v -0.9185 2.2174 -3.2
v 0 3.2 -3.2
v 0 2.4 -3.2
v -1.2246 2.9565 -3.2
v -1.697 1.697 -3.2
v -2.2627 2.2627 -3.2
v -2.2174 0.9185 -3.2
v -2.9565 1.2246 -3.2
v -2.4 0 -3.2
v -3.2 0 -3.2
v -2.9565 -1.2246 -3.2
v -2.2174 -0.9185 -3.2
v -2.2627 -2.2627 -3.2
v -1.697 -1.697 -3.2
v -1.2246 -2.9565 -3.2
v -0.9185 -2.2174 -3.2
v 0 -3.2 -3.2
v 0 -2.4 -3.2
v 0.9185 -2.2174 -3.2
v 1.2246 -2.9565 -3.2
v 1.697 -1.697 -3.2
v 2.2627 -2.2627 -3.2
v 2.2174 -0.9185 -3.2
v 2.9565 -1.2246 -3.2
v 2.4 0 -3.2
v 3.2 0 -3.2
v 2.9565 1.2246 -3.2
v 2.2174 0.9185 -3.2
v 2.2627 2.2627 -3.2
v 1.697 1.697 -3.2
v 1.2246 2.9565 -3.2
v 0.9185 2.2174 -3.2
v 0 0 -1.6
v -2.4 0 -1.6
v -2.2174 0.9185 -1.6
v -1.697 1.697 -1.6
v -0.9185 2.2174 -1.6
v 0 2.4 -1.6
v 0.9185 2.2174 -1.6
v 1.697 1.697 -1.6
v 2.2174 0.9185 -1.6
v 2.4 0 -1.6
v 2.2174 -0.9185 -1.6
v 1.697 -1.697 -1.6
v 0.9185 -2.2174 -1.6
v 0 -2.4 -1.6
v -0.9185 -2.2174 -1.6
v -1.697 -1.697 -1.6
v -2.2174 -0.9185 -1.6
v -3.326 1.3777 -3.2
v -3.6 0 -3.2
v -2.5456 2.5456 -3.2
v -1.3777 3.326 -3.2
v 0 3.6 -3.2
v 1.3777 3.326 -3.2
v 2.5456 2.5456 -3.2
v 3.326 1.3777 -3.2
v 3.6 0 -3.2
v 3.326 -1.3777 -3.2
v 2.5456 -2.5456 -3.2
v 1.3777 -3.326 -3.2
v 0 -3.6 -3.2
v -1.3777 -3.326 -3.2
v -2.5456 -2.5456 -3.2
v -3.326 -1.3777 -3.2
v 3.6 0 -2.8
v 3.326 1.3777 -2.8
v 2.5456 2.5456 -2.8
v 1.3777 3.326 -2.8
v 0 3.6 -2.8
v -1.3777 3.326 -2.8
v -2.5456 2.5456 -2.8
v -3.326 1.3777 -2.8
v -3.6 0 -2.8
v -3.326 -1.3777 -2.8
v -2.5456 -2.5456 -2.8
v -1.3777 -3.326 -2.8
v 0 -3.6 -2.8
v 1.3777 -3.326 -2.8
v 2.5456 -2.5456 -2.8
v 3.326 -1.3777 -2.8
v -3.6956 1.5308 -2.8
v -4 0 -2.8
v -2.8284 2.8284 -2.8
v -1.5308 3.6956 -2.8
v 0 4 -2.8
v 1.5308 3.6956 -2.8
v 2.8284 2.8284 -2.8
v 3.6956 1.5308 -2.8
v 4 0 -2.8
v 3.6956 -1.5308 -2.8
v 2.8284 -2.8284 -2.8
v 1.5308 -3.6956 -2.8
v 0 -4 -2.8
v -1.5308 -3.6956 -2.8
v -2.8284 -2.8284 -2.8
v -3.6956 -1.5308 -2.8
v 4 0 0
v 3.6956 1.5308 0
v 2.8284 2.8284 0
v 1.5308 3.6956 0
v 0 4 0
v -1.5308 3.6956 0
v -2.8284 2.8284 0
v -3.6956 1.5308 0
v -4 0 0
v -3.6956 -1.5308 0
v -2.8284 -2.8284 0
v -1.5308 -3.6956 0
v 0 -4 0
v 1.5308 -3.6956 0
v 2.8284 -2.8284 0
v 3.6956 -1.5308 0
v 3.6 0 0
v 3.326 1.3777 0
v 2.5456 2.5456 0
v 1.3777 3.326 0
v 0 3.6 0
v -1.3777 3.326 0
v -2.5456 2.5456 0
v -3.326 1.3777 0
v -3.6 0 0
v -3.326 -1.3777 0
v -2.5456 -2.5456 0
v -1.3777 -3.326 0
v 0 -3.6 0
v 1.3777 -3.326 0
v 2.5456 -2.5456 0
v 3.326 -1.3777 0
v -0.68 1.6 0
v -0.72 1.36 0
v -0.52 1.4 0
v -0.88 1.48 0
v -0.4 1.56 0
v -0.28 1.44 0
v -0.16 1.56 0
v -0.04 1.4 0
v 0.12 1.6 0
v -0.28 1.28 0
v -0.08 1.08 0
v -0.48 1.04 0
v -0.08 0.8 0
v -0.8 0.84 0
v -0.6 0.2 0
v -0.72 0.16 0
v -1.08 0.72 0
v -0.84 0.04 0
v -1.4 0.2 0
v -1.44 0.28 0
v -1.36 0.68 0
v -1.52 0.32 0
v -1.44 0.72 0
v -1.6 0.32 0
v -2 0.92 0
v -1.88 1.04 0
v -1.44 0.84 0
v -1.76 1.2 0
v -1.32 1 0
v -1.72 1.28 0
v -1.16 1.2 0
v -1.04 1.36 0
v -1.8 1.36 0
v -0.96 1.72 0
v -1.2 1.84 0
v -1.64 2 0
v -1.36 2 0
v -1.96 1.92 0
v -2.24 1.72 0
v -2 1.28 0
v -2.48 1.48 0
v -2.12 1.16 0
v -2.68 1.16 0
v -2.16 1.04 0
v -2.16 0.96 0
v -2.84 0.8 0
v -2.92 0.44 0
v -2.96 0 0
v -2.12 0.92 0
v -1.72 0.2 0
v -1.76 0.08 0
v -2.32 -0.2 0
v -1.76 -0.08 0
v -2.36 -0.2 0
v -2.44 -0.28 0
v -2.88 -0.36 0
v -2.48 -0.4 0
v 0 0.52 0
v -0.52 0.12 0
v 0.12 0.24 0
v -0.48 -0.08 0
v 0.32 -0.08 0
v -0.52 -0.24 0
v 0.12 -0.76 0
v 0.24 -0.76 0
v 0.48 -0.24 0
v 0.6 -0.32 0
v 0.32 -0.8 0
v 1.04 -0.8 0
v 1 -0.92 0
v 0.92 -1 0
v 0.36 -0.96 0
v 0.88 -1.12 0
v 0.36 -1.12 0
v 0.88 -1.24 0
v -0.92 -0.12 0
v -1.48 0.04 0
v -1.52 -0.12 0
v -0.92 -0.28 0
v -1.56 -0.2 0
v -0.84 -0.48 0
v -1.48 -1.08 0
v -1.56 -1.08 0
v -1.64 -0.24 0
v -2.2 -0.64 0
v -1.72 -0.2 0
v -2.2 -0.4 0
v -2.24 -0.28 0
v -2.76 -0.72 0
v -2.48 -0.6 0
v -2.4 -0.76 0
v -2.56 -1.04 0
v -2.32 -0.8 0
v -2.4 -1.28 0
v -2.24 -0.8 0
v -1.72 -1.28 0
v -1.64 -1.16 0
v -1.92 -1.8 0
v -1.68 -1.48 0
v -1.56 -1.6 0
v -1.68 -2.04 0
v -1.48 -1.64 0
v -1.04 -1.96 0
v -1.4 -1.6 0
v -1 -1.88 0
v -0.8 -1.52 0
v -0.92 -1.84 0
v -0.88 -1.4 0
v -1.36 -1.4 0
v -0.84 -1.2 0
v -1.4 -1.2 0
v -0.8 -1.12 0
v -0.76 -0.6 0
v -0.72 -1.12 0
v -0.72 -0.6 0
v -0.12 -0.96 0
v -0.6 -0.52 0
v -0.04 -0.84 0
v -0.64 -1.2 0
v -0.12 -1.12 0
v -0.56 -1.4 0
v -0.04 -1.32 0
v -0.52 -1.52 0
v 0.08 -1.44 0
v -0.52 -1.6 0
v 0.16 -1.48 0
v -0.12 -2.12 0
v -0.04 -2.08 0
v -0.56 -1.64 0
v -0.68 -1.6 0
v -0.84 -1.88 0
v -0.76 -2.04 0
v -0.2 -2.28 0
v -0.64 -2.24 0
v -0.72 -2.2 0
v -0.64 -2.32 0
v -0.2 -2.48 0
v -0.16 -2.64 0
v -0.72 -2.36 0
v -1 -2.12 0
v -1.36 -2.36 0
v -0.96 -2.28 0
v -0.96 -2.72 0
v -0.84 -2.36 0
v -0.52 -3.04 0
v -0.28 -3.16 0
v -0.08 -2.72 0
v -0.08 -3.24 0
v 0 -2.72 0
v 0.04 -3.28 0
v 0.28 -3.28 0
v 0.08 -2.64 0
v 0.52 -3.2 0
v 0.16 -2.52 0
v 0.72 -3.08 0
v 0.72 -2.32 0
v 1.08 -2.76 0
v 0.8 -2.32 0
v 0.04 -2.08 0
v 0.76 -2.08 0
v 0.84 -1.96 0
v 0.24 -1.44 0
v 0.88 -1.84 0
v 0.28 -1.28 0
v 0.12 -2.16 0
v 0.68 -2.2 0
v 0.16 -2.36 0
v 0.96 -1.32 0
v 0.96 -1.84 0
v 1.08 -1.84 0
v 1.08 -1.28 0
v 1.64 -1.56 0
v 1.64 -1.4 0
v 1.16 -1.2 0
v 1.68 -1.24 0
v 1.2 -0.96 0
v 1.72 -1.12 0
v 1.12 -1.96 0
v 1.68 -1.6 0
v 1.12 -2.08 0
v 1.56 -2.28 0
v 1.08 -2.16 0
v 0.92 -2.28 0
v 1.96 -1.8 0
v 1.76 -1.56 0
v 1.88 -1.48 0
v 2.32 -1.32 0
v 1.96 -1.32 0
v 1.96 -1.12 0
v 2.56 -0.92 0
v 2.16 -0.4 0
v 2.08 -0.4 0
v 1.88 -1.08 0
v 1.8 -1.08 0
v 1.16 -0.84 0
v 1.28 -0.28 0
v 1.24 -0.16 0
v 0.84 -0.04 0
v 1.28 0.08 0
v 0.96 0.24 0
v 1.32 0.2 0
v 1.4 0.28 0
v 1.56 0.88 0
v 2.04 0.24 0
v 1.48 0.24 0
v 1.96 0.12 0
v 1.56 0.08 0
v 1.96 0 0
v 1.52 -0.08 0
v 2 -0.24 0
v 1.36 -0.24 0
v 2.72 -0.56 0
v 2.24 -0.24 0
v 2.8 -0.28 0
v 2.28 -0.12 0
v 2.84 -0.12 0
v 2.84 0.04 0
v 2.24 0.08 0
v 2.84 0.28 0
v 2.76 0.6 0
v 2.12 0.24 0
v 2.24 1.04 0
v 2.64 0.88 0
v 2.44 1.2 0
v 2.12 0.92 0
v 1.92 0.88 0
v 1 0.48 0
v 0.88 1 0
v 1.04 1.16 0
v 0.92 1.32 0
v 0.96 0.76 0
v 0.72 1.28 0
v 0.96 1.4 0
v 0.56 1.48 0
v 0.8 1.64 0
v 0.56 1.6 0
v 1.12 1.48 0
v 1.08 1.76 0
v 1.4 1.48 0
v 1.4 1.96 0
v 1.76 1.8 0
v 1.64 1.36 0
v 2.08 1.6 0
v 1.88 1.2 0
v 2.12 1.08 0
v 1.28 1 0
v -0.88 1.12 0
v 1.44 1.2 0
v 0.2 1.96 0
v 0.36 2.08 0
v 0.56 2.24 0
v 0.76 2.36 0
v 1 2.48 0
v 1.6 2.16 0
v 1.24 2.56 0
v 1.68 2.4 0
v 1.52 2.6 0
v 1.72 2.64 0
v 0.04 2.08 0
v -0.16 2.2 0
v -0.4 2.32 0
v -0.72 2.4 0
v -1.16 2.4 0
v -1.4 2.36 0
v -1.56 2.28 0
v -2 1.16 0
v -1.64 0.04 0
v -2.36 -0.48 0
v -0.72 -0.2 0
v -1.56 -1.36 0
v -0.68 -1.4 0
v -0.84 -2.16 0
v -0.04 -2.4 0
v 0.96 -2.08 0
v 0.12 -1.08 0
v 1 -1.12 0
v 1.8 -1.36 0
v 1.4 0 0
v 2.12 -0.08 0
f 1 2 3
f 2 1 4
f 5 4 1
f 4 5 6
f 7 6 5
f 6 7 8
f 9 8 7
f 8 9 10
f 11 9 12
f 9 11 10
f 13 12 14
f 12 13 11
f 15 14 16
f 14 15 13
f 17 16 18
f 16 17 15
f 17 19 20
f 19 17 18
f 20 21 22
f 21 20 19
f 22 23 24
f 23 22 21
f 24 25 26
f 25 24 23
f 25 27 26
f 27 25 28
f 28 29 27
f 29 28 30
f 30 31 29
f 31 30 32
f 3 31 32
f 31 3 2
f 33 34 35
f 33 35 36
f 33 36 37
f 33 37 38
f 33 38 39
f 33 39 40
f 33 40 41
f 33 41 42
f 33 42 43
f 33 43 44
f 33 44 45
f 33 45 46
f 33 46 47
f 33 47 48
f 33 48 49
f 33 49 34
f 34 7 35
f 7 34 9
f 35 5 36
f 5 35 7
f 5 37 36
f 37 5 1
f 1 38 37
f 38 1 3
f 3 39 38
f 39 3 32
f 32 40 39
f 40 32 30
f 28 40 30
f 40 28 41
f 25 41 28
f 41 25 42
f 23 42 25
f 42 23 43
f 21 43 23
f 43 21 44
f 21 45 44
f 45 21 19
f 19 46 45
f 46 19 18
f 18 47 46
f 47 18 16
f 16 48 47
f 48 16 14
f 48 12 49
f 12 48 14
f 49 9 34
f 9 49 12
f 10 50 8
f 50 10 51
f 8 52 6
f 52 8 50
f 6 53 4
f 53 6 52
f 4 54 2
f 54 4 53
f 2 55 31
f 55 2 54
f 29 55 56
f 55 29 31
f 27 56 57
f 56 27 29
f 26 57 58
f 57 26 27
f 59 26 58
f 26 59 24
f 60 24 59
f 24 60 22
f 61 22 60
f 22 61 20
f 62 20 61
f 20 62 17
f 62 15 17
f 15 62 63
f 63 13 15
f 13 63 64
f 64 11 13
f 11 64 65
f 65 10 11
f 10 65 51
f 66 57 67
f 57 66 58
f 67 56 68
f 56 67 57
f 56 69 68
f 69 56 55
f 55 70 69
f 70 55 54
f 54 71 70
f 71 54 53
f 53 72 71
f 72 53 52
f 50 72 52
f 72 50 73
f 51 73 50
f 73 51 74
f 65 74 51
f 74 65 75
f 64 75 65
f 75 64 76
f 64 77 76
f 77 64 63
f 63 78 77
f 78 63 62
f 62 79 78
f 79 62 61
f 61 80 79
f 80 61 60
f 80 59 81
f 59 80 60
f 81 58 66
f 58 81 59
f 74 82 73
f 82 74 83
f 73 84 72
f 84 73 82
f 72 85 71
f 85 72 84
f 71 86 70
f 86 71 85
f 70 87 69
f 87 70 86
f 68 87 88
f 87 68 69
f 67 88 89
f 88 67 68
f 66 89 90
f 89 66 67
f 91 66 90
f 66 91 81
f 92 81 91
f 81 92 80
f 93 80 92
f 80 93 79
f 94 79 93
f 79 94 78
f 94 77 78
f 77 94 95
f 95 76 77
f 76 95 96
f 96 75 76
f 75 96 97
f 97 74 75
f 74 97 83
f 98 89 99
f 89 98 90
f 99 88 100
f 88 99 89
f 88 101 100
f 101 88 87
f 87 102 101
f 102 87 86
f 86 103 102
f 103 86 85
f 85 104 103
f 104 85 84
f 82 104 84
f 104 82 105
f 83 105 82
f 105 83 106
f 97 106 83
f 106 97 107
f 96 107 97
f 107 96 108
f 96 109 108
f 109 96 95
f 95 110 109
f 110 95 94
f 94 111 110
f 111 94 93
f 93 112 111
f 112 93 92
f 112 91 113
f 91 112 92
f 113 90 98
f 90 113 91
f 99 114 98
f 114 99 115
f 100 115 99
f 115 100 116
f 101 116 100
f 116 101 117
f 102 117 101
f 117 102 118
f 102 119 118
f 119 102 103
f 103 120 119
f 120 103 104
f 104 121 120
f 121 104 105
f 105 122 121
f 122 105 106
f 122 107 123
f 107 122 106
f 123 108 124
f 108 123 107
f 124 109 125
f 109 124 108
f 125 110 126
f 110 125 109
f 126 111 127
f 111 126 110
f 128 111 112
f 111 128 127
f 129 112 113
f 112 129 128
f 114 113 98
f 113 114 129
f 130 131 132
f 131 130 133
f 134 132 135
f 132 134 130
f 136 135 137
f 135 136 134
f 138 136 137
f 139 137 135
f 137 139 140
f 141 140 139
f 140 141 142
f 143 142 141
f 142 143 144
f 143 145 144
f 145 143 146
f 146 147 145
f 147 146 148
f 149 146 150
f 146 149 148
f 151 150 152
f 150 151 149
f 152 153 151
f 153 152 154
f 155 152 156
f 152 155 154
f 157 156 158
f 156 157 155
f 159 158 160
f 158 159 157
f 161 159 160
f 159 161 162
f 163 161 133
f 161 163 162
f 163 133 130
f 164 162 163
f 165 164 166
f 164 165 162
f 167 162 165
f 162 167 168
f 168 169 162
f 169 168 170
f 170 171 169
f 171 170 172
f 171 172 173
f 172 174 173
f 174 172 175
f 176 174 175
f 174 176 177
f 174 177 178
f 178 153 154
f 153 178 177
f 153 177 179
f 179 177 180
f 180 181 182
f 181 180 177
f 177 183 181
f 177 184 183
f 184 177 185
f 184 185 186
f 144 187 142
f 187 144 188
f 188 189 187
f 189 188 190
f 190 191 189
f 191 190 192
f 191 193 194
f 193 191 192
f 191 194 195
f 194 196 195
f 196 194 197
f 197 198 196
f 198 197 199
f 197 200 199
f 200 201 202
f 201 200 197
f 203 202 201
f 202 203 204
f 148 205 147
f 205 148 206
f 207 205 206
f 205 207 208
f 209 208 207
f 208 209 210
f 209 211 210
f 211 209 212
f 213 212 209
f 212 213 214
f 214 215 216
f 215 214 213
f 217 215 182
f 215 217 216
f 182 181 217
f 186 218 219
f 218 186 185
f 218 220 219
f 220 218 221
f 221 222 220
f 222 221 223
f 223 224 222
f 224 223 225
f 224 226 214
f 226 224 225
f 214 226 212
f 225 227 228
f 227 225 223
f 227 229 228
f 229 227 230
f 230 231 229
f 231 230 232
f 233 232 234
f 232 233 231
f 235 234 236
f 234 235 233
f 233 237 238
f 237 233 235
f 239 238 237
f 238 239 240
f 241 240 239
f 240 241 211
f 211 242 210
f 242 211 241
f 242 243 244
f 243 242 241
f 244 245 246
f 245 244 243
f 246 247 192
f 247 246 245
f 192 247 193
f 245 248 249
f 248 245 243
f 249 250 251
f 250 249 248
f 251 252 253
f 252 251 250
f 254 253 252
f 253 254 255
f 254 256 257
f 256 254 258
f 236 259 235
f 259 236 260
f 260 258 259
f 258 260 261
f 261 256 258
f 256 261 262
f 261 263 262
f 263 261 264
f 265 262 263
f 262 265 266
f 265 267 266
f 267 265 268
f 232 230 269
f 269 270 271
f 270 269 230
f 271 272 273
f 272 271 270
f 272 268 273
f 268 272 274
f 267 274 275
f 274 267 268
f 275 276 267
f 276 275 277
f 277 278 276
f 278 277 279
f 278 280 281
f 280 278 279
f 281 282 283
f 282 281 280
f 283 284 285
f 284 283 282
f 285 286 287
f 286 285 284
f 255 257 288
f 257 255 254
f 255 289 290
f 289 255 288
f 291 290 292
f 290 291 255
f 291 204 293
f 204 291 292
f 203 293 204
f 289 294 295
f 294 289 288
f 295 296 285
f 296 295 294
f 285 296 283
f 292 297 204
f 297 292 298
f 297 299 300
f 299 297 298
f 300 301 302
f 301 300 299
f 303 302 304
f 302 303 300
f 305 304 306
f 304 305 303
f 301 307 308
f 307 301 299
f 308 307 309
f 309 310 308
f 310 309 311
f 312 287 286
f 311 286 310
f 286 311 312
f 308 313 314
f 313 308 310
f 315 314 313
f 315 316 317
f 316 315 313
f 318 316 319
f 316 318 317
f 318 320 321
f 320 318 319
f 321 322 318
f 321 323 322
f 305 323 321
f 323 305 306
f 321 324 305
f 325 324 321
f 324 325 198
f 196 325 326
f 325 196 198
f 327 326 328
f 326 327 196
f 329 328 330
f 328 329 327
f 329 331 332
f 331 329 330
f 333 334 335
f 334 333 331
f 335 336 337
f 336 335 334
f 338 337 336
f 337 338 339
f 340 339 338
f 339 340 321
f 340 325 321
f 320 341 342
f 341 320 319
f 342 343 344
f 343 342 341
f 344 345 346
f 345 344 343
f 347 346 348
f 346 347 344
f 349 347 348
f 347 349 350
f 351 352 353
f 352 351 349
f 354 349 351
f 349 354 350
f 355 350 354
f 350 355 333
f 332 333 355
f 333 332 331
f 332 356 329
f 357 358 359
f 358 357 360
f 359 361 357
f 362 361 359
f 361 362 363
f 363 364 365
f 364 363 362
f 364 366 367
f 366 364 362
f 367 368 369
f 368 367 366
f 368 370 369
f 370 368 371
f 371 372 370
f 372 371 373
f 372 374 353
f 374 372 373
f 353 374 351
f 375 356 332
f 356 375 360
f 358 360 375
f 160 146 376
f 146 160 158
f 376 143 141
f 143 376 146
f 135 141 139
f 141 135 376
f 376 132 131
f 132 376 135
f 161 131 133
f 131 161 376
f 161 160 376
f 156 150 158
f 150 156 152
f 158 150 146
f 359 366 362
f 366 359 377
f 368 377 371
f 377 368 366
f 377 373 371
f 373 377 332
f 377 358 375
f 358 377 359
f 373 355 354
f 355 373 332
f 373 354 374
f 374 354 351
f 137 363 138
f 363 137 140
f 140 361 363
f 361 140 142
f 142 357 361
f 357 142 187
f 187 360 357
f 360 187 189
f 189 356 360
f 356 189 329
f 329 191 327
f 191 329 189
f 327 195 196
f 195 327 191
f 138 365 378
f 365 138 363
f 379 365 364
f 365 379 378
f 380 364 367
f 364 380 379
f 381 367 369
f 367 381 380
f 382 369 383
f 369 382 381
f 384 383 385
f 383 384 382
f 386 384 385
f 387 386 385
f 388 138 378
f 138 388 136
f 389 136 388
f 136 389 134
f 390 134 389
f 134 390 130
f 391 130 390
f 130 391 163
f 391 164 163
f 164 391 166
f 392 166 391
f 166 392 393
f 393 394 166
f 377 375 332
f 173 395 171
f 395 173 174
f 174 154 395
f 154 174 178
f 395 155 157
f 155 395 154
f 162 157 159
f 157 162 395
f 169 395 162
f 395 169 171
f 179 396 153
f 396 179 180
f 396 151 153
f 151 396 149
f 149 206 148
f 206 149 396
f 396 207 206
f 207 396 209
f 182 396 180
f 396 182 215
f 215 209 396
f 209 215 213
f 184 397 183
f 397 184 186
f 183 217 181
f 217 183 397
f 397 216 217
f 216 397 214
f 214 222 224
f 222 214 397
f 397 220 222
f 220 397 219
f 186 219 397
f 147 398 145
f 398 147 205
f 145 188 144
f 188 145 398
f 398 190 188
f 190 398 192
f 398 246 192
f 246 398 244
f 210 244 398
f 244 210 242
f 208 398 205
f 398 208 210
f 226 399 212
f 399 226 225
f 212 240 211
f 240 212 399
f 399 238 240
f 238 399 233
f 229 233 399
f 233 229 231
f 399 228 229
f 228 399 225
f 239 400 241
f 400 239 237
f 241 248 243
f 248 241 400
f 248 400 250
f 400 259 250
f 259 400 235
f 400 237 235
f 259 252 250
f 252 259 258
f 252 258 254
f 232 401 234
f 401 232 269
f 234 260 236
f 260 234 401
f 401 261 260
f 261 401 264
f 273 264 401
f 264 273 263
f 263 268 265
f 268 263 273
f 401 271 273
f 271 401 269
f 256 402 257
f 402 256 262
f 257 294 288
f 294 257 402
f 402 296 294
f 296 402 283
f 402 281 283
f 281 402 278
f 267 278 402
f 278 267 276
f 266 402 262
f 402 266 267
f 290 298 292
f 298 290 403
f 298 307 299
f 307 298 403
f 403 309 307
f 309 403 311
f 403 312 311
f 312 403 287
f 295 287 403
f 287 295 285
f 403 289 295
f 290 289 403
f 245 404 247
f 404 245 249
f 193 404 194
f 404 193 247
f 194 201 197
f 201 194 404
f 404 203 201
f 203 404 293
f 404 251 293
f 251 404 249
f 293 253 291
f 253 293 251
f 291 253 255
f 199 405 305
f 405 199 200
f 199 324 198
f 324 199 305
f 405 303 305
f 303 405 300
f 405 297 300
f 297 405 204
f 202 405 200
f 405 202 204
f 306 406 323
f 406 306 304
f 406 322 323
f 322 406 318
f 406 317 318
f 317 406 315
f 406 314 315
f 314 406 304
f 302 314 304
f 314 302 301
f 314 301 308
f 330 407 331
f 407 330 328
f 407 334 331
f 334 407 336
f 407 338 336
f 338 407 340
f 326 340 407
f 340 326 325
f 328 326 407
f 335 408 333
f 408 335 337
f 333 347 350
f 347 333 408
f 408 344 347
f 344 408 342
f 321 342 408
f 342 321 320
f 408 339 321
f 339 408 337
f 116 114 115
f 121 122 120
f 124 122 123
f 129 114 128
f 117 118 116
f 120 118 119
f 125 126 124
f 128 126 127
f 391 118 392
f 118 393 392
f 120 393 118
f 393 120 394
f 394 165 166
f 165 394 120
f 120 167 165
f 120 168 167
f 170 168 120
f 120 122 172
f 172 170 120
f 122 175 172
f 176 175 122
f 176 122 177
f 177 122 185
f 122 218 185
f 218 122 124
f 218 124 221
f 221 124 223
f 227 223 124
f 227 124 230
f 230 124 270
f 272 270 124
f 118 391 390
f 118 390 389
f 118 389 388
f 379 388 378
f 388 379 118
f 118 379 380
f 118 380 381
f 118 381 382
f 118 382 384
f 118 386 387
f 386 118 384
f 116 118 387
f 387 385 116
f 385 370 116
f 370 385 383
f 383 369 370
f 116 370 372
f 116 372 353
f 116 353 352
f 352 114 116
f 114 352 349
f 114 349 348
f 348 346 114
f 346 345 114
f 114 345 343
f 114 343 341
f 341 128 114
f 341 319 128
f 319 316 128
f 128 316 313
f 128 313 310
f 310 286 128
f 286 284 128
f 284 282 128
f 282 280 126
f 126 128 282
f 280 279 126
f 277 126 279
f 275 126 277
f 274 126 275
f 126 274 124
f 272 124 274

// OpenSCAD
use <../lib.scad>
use <s/98138p0js01.scad>
use <s/98138p0js02.scad>
use <s/98138p0js03.scad>
use <s/98138p0js04.scad>
use <s/98138s01.scad>
function ldraw_lib__98138p0j() = [
// 0 Tile  1 x  1 Round with Strawberry Pattern
// 0 Name: 98138p0j.dat
// 0 Author: Evert-Jan Boer [ejboer]
// 0 !LDRAW_ORG Part UPDATE 2026-04
// 0 !LICENSE Licensed under CC BY 4.0 : see CAreadme.txt
// 
// 0 BFC CERTIFY CCW
  [0,"BFC","CERTIFY"],
  [0,"BFC","CCW"],
// 
// 0 !KEYWORDS BrickLink 98138pb015, Brickowl 988162, Brickset 15826
// 0 !KEYWORDS Rebrickable 98138pr0017, set 10749
// 
// 0 !HISTORY 2016-12-31 [PTadmin] Official Update 2016-01
// 0 !HISTORY 2025-08-07 [RainbowDolphin] Subparted for common use
// 0 !HISTORY 2026-04-27 [OrionP] Official Update 2026-04
// 
// 1 16 0 0 0 1 0 0 0 1 0 0 0 1 s\98138s01.dat
  [1,16,0,0,0,1,0,0,0,1,0,0,0,1, ldraw_lib__s__98138s01()],
// 1 4 0 0 0 1 0 0 0 1 0 0 0 1 s\98138p0js01.dat
  [1,4,0,0,0,1,0,0,0,1,0,0,0,1, ldraw_lib__s__98138p0js01()],
// 1 27 0 0 0 1 0 0 0 1 0 0 0 1 s\98138p0js02.dat
  [1,27,0,0,0,1,0,0,0,1,0,0,0,1, ldraw_lib__s__98138p0js02()],
// 1 15 0 0 0 1 0 0 0 1 0 0 0 1 s\98138p0js03.dat
  [1,15,0,0,0,1,0,0,0,1,0,0,0,1, ldraw_lib__s__98138p0js03()],
// 1 16 0 0 0 1 0 0 0 1 0 0 0 1 s\98138p0js04.dat
  [1,16,0,0,0,1,0,0,0,1,0,0,0,1, ldraw_lib__s__98138p0js04()],
];
module ldraw_lib__98138p0j(step=0, col=false, unit=2/5, alt=false, line=0.2, solid=!$preview)
    makepoly(ldraw_lib__98138p0j(), step=step, col=col, unit=unit, alt=alt, line=line, solid=solid);
ldraw_lib__98138p0j(line=0.2);
